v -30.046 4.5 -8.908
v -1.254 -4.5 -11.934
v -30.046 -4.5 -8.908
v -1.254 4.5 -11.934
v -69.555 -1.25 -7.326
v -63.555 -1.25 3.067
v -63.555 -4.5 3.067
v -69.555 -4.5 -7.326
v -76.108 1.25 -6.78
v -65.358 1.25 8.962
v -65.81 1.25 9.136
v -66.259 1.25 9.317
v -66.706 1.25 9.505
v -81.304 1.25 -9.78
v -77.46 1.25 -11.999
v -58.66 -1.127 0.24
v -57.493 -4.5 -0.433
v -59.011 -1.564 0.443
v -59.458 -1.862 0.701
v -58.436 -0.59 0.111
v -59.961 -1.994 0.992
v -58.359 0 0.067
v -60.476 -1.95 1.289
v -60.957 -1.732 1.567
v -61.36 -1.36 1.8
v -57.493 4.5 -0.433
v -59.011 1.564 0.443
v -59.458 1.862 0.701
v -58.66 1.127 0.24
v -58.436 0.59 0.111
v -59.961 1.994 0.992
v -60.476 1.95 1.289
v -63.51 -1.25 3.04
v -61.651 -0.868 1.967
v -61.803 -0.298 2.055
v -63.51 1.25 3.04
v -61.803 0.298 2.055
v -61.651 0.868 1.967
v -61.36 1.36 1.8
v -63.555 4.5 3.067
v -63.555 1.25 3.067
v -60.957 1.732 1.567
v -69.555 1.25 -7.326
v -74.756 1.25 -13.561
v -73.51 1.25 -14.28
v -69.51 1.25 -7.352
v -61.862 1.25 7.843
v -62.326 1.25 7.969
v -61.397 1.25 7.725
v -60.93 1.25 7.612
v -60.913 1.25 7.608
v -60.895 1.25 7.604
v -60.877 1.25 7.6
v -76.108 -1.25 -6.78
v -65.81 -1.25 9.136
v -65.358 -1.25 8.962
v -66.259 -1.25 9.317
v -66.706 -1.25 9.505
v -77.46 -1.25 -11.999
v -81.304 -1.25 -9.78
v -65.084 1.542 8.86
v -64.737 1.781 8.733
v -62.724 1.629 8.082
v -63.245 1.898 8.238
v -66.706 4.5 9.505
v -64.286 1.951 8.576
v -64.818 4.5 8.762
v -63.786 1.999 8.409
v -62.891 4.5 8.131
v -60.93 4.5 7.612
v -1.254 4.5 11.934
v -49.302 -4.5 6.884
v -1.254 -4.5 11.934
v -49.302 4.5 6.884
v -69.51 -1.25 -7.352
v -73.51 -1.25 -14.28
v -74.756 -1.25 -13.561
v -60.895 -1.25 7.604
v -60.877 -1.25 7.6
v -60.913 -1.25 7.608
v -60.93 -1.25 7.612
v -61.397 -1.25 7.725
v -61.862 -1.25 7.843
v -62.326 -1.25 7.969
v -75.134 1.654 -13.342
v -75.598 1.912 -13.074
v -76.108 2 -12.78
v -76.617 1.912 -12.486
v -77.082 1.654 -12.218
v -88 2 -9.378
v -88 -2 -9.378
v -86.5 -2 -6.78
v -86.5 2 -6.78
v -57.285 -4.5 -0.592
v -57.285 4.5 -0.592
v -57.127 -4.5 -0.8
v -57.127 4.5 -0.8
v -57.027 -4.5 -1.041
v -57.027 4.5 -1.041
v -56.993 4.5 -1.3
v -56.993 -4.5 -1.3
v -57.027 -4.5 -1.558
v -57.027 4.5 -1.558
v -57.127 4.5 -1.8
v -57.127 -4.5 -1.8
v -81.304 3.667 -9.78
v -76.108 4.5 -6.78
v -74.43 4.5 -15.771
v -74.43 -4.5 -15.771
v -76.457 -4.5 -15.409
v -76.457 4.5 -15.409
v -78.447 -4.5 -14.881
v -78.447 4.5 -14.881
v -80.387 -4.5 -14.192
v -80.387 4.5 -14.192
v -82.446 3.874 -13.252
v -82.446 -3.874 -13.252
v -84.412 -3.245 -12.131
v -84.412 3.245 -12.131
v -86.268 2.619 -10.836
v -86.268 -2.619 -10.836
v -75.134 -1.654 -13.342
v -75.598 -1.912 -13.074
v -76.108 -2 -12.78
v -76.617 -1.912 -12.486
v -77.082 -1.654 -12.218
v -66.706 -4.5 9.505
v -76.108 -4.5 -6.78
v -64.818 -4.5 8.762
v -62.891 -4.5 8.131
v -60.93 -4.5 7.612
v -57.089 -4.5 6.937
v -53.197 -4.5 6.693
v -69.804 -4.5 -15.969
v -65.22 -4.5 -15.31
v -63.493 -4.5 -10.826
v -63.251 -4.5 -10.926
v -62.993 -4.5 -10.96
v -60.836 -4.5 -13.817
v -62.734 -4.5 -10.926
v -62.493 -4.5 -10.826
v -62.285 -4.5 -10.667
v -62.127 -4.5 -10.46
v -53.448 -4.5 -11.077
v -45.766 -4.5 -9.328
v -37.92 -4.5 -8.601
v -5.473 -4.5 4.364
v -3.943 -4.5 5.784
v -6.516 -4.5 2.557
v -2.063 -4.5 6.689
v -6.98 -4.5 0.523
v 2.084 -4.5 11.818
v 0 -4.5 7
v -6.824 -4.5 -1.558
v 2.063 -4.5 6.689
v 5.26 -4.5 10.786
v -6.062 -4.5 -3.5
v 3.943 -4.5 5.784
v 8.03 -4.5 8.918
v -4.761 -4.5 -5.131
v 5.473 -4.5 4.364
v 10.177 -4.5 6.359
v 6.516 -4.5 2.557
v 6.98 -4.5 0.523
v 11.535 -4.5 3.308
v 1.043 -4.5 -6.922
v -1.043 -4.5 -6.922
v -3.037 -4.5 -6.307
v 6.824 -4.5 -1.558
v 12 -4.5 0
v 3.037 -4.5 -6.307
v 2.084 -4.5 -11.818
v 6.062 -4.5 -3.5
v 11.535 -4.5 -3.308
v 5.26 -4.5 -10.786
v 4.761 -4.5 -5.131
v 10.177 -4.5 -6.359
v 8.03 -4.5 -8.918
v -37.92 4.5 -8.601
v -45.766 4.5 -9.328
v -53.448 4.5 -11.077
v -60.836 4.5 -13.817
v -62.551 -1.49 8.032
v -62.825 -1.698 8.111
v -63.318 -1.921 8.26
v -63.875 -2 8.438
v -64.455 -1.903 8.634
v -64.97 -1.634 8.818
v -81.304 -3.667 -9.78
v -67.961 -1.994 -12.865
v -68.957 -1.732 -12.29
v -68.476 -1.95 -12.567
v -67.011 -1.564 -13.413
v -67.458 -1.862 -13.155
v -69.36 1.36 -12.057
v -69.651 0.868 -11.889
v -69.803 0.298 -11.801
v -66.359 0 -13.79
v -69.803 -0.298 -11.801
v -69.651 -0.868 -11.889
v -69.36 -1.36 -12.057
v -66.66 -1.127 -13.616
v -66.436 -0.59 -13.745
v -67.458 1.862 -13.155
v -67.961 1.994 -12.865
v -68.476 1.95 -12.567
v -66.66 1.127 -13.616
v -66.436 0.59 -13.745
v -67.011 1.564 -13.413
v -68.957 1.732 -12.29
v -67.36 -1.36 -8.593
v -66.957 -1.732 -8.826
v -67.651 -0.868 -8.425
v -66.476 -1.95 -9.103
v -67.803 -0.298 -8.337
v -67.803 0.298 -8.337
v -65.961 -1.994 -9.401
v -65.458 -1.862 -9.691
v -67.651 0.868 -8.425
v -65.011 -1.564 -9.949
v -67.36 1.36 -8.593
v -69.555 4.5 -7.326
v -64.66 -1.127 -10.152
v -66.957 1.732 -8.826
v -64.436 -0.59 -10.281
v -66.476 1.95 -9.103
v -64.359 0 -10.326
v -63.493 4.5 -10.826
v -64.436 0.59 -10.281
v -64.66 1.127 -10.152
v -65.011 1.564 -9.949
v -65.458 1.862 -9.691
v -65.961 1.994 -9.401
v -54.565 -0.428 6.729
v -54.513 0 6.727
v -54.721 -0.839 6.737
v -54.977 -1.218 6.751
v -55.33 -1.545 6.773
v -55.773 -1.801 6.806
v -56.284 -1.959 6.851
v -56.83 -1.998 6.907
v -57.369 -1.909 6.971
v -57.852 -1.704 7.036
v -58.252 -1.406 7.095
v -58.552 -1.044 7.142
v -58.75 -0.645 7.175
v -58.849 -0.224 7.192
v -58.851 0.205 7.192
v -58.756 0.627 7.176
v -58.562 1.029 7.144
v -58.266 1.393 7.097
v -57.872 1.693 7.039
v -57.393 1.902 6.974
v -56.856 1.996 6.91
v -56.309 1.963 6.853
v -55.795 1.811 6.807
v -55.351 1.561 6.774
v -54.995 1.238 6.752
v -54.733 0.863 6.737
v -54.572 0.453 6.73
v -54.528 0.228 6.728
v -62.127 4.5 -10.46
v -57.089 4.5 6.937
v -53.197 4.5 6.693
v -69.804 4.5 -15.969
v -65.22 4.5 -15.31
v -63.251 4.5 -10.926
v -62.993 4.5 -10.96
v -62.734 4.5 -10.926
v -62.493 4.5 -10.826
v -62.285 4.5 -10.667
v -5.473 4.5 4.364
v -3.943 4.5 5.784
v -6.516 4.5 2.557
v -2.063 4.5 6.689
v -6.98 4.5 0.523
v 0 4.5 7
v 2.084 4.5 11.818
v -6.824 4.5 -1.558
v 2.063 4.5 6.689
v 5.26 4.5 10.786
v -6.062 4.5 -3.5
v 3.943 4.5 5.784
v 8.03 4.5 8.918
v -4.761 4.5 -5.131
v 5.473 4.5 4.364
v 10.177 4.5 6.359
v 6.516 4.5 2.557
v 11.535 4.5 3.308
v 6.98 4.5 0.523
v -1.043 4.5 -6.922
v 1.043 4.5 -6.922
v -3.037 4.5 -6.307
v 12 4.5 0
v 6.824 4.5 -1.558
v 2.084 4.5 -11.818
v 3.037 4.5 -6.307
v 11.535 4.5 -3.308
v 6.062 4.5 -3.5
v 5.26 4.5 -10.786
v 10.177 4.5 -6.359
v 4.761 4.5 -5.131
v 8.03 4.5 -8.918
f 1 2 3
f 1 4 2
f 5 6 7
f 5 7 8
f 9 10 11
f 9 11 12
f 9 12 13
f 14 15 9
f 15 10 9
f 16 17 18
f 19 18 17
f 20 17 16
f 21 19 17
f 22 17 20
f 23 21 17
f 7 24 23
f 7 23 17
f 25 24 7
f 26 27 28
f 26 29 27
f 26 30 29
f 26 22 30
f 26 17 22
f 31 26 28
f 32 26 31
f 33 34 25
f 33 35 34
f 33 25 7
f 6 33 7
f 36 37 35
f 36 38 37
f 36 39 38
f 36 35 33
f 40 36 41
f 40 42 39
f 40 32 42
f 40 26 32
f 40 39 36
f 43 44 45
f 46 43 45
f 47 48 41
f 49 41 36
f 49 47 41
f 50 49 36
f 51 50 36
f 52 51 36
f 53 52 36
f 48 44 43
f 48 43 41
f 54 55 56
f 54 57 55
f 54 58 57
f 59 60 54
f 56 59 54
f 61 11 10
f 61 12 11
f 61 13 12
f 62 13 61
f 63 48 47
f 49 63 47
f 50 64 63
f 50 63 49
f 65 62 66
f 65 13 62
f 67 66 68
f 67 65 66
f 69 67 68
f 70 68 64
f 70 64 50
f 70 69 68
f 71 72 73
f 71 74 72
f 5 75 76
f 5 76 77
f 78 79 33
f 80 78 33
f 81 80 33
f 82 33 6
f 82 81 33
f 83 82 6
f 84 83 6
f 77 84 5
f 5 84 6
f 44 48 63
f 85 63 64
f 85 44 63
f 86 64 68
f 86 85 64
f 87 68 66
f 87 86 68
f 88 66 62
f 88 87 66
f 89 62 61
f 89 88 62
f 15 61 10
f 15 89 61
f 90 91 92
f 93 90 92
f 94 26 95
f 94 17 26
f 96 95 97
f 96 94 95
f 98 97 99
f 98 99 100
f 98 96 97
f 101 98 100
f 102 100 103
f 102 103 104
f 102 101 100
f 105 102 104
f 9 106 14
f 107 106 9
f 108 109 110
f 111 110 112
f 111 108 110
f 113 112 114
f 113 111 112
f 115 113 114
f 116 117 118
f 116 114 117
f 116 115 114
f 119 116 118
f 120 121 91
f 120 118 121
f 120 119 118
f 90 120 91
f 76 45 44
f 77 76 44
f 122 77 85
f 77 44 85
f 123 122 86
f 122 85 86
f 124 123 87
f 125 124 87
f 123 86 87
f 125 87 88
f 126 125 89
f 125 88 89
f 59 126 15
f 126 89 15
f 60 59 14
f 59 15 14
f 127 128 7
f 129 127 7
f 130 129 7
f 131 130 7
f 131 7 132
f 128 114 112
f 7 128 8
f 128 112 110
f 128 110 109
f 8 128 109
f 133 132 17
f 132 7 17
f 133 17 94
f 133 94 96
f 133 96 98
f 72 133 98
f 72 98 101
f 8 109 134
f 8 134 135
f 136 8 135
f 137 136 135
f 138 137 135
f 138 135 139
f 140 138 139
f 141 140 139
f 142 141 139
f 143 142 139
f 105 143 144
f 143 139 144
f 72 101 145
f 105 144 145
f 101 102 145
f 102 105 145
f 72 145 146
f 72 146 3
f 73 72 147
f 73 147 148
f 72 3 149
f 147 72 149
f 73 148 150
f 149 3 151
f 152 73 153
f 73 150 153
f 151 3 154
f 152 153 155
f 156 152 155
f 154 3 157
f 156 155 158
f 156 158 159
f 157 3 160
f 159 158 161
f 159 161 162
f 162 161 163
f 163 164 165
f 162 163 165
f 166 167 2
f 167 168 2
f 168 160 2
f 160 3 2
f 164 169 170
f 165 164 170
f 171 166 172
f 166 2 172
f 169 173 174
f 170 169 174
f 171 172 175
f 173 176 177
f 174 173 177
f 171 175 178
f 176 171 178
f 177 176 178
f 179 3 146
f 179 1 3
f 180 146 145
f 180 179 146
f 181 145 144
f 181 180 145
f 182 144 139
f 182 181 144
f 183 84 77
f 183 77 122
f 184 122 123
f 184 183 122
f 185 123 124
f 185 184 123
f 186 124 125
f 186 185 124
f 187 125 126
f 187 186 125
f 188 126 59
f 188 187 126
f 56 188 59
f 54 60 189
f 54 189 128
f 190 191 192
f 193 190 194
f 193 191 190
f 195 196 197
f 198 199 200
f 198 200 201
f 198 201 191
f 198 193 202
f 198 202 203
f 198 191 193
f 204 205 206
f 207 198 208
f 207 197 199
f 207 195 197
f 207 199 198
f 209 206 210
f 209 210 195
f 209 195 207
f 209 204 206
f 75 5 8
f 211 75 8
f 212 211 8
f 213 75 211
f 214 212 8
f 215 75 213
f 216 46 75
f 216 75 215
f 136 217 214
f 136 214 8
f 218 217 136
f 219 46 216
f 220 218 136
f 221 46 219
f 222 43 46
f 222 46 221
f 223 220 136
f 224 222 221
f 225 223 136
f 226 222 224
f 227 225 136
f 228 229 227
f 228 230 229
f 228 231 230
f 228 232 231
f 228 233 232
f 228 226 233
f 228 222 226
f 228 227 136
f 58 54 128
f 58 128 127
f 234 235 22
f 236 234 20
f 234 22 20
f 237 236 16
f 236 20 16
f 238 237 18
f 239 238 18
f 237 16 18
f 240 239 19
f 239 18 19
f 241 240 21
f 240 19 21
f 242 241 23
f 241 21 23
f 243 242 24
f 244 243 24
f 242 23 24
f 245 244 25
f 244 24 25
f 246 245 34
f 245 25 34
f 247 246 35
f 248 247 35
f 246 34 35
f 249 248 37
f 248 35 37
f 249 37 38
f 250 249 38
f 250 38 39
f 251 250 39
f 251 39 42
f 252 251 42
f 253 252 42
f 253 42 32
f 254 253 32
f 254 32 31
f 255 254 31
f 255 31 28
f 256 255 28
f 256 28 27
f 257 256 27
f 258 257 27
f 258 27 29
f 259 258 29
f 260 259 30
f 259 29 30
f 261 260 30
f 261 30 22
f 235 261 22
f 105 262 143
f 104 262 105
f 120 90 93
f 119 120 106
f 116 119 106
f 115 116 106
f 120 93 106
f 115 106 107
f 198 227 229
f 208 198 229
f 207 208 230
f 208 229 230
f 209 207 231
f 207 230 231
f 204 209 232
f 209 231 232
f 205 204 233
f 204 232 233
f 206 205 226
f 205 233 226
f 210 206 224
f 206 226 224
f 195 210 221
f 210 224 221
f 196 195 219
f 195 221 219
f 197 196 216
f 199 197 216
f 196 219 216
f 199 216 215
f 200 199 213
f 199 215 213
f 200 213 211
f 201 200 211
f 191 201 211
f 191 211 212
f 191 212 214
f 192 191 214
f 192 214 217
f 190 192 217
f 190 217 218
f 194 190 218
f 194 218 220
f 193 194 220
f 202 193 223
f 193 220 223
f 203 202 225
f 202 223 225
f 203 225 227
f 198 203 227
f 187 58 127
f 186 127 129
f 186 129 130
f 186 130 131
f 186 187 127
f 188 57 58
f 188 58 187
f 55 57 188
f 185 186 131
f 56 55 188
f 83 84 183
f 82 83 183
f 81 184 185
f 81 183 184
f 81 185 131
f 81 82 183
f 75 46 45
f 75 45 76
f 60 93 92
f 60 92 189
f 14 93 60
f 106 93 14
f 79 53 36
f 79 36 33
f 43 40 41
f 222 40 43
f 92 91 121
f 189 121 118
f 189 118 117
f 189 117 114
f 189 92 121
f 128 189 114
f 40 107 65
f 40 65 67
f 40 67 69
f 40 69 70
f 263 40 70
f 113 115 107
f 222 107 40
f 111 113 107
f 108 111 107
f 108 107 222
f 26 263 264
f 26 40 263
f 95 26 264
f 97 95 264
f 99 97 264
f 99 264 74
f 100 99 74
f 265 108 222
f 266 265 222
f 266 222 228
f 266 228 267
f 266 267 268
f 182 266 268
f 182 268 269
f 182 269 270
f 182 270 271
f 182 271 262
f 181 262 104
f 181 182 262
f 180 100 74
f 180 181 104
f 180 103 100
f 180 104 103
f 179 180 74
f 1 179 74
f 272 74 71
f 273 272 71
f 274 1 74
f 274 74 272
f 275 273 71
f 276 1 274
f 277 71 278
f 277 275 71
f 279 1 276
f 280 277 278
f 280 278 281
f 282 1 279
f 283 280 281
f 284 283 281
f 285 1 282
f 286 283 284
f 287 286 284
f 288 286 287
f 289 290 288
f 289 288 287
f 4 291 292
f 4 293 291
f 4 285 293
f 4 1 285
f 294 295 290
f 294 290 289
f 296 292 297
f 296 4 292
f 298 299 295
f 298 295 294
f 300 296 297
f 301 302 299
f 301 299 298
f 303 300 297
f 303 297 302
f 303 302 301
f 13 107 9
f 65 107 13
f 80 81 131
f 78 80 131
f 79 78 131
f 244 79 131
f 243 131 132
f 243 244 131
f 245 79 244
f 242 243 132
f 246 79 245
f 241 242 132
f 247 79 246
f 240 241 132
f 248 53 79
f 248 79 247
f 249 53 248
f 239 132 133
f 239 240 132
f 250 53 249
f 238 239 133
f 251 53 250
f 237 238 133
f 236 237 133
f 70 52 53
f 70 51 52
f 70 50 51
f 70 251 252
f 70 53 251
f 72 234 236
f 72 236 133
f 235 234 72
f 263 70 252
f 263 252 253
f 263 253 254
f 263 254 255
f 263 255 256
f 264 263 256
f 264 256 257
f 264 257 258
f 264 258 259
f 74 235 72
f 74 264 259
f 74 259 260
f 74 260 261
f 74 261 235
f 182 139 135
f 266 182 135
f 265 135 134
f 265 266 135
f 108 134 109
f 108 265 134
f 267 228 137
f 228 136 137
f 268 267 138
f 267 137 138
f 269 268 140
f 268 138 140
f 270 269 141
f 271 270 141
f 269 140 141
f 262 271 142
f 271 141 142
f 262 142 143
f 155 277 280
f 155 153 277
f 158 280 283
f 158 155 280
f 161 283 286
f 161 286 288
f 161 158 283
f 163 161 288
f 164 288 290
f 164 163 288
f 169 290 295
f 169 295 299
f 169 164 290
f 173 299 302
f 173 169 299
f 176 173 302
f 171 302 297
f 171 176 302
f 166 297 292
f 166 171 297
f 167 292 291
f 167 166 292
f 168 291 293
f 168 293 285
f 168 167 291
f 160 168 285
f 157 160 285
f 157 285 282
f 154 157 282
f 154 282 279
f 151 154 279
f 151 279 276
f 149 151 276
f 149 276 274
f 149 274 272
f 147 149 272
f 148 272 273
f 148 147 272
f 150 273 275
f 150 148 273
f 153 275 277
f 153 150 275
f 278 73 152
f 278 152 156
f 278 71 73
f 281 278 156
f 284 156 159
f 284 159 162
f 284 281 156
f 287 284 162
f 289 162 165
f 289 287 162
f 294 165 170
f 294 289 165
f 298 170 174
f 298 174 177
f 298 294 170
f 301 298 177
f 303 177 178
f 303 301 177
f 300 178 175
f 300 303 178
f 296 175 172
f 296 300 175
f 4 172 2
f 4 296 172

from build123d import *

# Parameters (mm, degrees)
SKETCH1_R           = 7
BOSS_EXTRUDE1_DEPTH = 4.5
SKETCH3_R           = 2
CUT_EXTRUDE1_DEPTH  = 4
SKETCH4_R           = 2
CUT_EXTRUDE2_DEPTH  = 83.455425528
CUT_EXTRUDE3_DEPTH  = 83.769471168
CUT_EXTRUDE4_DEPTH  = 24
FILLET2_R           = 1
CUT_EXTRUDE5_DEPTH  = 1.264527456


# Read off the part's stored shape, not the designer's step: Cut-Extrude5
with BuildPart() as part:
    # Sketch1 → Boss-Extrude1 (new, symmetric)
    # profile 1 of 2: a face of its own
    with BuildSketch(Plane(origin=(0, 0, 0), x_dir=(1, 0, 0), z_dir=(0, 1, 0))):
        with BuildLine():
            ThreePointArc((-1.254341559, -11.934262744), (12, 0), (-1.254341559, 11.934262744))
            Line((-1.254341559, 11.934262744), (-30.046239367, 8.908112343))
            ThreePointArc((-30.046239367, 8.908112343), (-45.765521358, 9.327899994), (-60.835880843, 13.817478255))
            ThreePointArc((-60.835880843, 13.817478255), (-67.496359977, 15.745901742), (-74.430347821, 15.770640847))
            Line((-74.430347821, 15.770640847), (-69.554710794, 7.325789796))
            Line((-69.554710794, 7.325789796), (-62.626507563, 11.325789796))
            Line((-62.626507563, 11.325789796), (-56.626507563, 0.933484951))
            Line((-56.626507563, 0.933484951), (-63.554710794, -3.066515049))
            Line((-63.554710794, -3.066515049), (-60.930347821, -7.612045055))
            ThreePointArc((-60.930347821, -7.612045055), (-55.146607543, -6.760877199), (-49.301873665, -6.884263626))
            Line((-49.301873665, -6.884263626), (-1.254341559, -11.934262744))
        make_face()
        with Locations(Location((0, 0, 0), (0, 0, 270))):
            Circle(SKETCH1_R, mode=Mode.SUBTRACT)
    # profile 2 of 2: a face of its own
    with BuildSketch(Plane(origin=(0, 0, 0), x_dir=(1, 0, 0), z_dir=(0, 1, 0))):
        with BuildLine():
            Line((-69.554710794, 7.325789796), (-74.430347821, 15.770640847))
            ThreePointArc((-74.430347821, 15.770640847), (-81.705916239, 13.616086965), (-88, 9.37810303))
            Line((-88, 9.37810303), (-86.5, 6.780026819))
            Line((-86.5, 6.780026819), (-81.303847577, 9.780026819))
            Line((-81.303847577, 9.780026819), (-76.107695155, 6.780026819))
            Line((-76.107695155, 6.780026819), (-66.705771366, -9.504582872))
            ThreePointArc((-66.705771366, -9.504582872), (-63.859216184, -8.432717138), (-60.930347821, -7.612045055))
            Line((-60.930347821, -7.612045055), (-63.554710794, -3.066515049))
            Line((-63.554710794, -3.066515049), (-69.554710794, 7.325789796))
        make_face()
    extrude(amount=BOSS_EXTRUDE1_DEPTH, both=True)

    # Sketch3 → Cut-Extrude1 (cut)
    with BuildSketch(Plane(origin=(-20.560837732, 0, -35.612415597), x_dir=(0.8660254037844358, 0, -0.5000000000000051), z_dir=(0.500000000000005, 0, 0.8660254037844357))):
        with Locations((-52.573251602, 0)):
            Circle(SKETCH3_R)
    extrude(amount=-CUT_EXTRUDE1_DEPTH, mode=Mode.SUBTRACT)

    # Sketch4 → Cut-Extrude2 (cut, through all)
    with BuildSketch(Plane(origin=(-14.560837732, 0, -25.220110752), x_dir=(-0.8660254037844364, 0, 0.5000000000000041), z_dir=(-0.5000000000000041, 0, -0.8660254037844364))):
        with Locations(Location((52.573251602, 0, 0), (0, 0, 180))):
            Circle(SKETCH4_R)
    extrude(amount=-CUT_EXTRUDE2_DEPTH, mode=Mode.SUBTRACT)

    # Sketch6 → Cut-Extrude3 (cut, through all)
    with BuildSketch(Plane(origin=(-12.560837732, 0, -21.756009137), x_dir=(0.8660254037844358, 0, -0.5000000000000051), z_dir=(0.500000000000005, 0, 0.8660254037844357))):
        Polygon((-71.521184018, -2), (-62.521184018, -4.5), (-71.521184018, -4.5), align=None)
        Polygon((-62.521184018, 4.5), (-71.521184018, 4.5), (-71.521184018, 2), align=None)
    extrude(amount=-CUT_EXTRUDE3_DEPTH, mode=Mode.SUBTRACT)

    # Sketch6<4> → Cut-Extrude4 (cut)
    with BuildSketch(Plane(origin=(-12.560837732, 0, -21.756009137), x_dir=(0.8660254037844358, 0, -0.5000000000000051), z_dir=(0.500000000000005, 0, 0.8660254037844357))):
        with BuildLine():
            Line((-61.082433518, -1.25), (-65.521184018, -1.25))
            Line((-65.521184018, -1.25), (-65.521184018, 1.25))
            Line((-65.521184018, 1.25), (-61.082433518, 1.25))
            ThreePointArc((-61.082433518, 1.25), (-59.521184018, 2), (-57.959934518, 1.25))
            Line((-57.959934518, 1.25), (-56.521184018, 1.25))
            Line((-56.521184018, 1.25), (-56.521184018, -1.25))
            Line((-56.521184018, -1.25), (-57.959934518, -1.25))
            ThreePointArc((-57.959934518, -1.25), (-59.521184018, -2), (-61.082433518, -1.25))
        make_face()
    extrude(amount=-CUT_EXTRUDE4_DEPTH, mode=Mode.SUBTRACT)

    # Fillet2
    fillet2_edges = [part.edges().sort_by_distance(p)[0] for p in [
        (-56.626507563, 0, -0.933484951),
        (-62.626507563, 0, -11.325789796),
    ]]
    fillet(fillet2_edges, radius=FILLET2_R)

    # Cut-Extrude5 outline → Cut-Extrude5 (cut)
    with BuildSketch(Plane(origin=(-12.560837732, 0, -21.756009137), x_dir=(0.8660254037844358, 0, -0.5000000000000051), z_dir=(0.500000000000005, 0, 0.8660254037844357))):
        with BuildLine():
            ThreePointArc((-57.959934518, 1.25), (-59.521184018, 2), (-61.082433518, 1.25))
            Line((-61.082433518, 1.25), (-62.521184018, 1.25))
            Line((-62.521184018, 1.25), (-62.521184018, -1.25))
            Line((-62.521184018, -1.25), (-61.082433518, -1.25))
            ThreePointArc((-61.082433518, -1.25), (-59.521184018, -2), (-57.959934518, -1.25))
            Line((-57.959934518, -1.25), (-56.521184018, -1.25))
            Line((-56.521184018, -1.25), (-56.521184018, 1.25))
            Line((-56.521184018, 1.25), (-57.959934518, 1.25))
        make_face()
    extrude(amount=CUT_EXTRUDE5_DEPTH, mode=Mode.SUBTRACT)


solid = part.part
